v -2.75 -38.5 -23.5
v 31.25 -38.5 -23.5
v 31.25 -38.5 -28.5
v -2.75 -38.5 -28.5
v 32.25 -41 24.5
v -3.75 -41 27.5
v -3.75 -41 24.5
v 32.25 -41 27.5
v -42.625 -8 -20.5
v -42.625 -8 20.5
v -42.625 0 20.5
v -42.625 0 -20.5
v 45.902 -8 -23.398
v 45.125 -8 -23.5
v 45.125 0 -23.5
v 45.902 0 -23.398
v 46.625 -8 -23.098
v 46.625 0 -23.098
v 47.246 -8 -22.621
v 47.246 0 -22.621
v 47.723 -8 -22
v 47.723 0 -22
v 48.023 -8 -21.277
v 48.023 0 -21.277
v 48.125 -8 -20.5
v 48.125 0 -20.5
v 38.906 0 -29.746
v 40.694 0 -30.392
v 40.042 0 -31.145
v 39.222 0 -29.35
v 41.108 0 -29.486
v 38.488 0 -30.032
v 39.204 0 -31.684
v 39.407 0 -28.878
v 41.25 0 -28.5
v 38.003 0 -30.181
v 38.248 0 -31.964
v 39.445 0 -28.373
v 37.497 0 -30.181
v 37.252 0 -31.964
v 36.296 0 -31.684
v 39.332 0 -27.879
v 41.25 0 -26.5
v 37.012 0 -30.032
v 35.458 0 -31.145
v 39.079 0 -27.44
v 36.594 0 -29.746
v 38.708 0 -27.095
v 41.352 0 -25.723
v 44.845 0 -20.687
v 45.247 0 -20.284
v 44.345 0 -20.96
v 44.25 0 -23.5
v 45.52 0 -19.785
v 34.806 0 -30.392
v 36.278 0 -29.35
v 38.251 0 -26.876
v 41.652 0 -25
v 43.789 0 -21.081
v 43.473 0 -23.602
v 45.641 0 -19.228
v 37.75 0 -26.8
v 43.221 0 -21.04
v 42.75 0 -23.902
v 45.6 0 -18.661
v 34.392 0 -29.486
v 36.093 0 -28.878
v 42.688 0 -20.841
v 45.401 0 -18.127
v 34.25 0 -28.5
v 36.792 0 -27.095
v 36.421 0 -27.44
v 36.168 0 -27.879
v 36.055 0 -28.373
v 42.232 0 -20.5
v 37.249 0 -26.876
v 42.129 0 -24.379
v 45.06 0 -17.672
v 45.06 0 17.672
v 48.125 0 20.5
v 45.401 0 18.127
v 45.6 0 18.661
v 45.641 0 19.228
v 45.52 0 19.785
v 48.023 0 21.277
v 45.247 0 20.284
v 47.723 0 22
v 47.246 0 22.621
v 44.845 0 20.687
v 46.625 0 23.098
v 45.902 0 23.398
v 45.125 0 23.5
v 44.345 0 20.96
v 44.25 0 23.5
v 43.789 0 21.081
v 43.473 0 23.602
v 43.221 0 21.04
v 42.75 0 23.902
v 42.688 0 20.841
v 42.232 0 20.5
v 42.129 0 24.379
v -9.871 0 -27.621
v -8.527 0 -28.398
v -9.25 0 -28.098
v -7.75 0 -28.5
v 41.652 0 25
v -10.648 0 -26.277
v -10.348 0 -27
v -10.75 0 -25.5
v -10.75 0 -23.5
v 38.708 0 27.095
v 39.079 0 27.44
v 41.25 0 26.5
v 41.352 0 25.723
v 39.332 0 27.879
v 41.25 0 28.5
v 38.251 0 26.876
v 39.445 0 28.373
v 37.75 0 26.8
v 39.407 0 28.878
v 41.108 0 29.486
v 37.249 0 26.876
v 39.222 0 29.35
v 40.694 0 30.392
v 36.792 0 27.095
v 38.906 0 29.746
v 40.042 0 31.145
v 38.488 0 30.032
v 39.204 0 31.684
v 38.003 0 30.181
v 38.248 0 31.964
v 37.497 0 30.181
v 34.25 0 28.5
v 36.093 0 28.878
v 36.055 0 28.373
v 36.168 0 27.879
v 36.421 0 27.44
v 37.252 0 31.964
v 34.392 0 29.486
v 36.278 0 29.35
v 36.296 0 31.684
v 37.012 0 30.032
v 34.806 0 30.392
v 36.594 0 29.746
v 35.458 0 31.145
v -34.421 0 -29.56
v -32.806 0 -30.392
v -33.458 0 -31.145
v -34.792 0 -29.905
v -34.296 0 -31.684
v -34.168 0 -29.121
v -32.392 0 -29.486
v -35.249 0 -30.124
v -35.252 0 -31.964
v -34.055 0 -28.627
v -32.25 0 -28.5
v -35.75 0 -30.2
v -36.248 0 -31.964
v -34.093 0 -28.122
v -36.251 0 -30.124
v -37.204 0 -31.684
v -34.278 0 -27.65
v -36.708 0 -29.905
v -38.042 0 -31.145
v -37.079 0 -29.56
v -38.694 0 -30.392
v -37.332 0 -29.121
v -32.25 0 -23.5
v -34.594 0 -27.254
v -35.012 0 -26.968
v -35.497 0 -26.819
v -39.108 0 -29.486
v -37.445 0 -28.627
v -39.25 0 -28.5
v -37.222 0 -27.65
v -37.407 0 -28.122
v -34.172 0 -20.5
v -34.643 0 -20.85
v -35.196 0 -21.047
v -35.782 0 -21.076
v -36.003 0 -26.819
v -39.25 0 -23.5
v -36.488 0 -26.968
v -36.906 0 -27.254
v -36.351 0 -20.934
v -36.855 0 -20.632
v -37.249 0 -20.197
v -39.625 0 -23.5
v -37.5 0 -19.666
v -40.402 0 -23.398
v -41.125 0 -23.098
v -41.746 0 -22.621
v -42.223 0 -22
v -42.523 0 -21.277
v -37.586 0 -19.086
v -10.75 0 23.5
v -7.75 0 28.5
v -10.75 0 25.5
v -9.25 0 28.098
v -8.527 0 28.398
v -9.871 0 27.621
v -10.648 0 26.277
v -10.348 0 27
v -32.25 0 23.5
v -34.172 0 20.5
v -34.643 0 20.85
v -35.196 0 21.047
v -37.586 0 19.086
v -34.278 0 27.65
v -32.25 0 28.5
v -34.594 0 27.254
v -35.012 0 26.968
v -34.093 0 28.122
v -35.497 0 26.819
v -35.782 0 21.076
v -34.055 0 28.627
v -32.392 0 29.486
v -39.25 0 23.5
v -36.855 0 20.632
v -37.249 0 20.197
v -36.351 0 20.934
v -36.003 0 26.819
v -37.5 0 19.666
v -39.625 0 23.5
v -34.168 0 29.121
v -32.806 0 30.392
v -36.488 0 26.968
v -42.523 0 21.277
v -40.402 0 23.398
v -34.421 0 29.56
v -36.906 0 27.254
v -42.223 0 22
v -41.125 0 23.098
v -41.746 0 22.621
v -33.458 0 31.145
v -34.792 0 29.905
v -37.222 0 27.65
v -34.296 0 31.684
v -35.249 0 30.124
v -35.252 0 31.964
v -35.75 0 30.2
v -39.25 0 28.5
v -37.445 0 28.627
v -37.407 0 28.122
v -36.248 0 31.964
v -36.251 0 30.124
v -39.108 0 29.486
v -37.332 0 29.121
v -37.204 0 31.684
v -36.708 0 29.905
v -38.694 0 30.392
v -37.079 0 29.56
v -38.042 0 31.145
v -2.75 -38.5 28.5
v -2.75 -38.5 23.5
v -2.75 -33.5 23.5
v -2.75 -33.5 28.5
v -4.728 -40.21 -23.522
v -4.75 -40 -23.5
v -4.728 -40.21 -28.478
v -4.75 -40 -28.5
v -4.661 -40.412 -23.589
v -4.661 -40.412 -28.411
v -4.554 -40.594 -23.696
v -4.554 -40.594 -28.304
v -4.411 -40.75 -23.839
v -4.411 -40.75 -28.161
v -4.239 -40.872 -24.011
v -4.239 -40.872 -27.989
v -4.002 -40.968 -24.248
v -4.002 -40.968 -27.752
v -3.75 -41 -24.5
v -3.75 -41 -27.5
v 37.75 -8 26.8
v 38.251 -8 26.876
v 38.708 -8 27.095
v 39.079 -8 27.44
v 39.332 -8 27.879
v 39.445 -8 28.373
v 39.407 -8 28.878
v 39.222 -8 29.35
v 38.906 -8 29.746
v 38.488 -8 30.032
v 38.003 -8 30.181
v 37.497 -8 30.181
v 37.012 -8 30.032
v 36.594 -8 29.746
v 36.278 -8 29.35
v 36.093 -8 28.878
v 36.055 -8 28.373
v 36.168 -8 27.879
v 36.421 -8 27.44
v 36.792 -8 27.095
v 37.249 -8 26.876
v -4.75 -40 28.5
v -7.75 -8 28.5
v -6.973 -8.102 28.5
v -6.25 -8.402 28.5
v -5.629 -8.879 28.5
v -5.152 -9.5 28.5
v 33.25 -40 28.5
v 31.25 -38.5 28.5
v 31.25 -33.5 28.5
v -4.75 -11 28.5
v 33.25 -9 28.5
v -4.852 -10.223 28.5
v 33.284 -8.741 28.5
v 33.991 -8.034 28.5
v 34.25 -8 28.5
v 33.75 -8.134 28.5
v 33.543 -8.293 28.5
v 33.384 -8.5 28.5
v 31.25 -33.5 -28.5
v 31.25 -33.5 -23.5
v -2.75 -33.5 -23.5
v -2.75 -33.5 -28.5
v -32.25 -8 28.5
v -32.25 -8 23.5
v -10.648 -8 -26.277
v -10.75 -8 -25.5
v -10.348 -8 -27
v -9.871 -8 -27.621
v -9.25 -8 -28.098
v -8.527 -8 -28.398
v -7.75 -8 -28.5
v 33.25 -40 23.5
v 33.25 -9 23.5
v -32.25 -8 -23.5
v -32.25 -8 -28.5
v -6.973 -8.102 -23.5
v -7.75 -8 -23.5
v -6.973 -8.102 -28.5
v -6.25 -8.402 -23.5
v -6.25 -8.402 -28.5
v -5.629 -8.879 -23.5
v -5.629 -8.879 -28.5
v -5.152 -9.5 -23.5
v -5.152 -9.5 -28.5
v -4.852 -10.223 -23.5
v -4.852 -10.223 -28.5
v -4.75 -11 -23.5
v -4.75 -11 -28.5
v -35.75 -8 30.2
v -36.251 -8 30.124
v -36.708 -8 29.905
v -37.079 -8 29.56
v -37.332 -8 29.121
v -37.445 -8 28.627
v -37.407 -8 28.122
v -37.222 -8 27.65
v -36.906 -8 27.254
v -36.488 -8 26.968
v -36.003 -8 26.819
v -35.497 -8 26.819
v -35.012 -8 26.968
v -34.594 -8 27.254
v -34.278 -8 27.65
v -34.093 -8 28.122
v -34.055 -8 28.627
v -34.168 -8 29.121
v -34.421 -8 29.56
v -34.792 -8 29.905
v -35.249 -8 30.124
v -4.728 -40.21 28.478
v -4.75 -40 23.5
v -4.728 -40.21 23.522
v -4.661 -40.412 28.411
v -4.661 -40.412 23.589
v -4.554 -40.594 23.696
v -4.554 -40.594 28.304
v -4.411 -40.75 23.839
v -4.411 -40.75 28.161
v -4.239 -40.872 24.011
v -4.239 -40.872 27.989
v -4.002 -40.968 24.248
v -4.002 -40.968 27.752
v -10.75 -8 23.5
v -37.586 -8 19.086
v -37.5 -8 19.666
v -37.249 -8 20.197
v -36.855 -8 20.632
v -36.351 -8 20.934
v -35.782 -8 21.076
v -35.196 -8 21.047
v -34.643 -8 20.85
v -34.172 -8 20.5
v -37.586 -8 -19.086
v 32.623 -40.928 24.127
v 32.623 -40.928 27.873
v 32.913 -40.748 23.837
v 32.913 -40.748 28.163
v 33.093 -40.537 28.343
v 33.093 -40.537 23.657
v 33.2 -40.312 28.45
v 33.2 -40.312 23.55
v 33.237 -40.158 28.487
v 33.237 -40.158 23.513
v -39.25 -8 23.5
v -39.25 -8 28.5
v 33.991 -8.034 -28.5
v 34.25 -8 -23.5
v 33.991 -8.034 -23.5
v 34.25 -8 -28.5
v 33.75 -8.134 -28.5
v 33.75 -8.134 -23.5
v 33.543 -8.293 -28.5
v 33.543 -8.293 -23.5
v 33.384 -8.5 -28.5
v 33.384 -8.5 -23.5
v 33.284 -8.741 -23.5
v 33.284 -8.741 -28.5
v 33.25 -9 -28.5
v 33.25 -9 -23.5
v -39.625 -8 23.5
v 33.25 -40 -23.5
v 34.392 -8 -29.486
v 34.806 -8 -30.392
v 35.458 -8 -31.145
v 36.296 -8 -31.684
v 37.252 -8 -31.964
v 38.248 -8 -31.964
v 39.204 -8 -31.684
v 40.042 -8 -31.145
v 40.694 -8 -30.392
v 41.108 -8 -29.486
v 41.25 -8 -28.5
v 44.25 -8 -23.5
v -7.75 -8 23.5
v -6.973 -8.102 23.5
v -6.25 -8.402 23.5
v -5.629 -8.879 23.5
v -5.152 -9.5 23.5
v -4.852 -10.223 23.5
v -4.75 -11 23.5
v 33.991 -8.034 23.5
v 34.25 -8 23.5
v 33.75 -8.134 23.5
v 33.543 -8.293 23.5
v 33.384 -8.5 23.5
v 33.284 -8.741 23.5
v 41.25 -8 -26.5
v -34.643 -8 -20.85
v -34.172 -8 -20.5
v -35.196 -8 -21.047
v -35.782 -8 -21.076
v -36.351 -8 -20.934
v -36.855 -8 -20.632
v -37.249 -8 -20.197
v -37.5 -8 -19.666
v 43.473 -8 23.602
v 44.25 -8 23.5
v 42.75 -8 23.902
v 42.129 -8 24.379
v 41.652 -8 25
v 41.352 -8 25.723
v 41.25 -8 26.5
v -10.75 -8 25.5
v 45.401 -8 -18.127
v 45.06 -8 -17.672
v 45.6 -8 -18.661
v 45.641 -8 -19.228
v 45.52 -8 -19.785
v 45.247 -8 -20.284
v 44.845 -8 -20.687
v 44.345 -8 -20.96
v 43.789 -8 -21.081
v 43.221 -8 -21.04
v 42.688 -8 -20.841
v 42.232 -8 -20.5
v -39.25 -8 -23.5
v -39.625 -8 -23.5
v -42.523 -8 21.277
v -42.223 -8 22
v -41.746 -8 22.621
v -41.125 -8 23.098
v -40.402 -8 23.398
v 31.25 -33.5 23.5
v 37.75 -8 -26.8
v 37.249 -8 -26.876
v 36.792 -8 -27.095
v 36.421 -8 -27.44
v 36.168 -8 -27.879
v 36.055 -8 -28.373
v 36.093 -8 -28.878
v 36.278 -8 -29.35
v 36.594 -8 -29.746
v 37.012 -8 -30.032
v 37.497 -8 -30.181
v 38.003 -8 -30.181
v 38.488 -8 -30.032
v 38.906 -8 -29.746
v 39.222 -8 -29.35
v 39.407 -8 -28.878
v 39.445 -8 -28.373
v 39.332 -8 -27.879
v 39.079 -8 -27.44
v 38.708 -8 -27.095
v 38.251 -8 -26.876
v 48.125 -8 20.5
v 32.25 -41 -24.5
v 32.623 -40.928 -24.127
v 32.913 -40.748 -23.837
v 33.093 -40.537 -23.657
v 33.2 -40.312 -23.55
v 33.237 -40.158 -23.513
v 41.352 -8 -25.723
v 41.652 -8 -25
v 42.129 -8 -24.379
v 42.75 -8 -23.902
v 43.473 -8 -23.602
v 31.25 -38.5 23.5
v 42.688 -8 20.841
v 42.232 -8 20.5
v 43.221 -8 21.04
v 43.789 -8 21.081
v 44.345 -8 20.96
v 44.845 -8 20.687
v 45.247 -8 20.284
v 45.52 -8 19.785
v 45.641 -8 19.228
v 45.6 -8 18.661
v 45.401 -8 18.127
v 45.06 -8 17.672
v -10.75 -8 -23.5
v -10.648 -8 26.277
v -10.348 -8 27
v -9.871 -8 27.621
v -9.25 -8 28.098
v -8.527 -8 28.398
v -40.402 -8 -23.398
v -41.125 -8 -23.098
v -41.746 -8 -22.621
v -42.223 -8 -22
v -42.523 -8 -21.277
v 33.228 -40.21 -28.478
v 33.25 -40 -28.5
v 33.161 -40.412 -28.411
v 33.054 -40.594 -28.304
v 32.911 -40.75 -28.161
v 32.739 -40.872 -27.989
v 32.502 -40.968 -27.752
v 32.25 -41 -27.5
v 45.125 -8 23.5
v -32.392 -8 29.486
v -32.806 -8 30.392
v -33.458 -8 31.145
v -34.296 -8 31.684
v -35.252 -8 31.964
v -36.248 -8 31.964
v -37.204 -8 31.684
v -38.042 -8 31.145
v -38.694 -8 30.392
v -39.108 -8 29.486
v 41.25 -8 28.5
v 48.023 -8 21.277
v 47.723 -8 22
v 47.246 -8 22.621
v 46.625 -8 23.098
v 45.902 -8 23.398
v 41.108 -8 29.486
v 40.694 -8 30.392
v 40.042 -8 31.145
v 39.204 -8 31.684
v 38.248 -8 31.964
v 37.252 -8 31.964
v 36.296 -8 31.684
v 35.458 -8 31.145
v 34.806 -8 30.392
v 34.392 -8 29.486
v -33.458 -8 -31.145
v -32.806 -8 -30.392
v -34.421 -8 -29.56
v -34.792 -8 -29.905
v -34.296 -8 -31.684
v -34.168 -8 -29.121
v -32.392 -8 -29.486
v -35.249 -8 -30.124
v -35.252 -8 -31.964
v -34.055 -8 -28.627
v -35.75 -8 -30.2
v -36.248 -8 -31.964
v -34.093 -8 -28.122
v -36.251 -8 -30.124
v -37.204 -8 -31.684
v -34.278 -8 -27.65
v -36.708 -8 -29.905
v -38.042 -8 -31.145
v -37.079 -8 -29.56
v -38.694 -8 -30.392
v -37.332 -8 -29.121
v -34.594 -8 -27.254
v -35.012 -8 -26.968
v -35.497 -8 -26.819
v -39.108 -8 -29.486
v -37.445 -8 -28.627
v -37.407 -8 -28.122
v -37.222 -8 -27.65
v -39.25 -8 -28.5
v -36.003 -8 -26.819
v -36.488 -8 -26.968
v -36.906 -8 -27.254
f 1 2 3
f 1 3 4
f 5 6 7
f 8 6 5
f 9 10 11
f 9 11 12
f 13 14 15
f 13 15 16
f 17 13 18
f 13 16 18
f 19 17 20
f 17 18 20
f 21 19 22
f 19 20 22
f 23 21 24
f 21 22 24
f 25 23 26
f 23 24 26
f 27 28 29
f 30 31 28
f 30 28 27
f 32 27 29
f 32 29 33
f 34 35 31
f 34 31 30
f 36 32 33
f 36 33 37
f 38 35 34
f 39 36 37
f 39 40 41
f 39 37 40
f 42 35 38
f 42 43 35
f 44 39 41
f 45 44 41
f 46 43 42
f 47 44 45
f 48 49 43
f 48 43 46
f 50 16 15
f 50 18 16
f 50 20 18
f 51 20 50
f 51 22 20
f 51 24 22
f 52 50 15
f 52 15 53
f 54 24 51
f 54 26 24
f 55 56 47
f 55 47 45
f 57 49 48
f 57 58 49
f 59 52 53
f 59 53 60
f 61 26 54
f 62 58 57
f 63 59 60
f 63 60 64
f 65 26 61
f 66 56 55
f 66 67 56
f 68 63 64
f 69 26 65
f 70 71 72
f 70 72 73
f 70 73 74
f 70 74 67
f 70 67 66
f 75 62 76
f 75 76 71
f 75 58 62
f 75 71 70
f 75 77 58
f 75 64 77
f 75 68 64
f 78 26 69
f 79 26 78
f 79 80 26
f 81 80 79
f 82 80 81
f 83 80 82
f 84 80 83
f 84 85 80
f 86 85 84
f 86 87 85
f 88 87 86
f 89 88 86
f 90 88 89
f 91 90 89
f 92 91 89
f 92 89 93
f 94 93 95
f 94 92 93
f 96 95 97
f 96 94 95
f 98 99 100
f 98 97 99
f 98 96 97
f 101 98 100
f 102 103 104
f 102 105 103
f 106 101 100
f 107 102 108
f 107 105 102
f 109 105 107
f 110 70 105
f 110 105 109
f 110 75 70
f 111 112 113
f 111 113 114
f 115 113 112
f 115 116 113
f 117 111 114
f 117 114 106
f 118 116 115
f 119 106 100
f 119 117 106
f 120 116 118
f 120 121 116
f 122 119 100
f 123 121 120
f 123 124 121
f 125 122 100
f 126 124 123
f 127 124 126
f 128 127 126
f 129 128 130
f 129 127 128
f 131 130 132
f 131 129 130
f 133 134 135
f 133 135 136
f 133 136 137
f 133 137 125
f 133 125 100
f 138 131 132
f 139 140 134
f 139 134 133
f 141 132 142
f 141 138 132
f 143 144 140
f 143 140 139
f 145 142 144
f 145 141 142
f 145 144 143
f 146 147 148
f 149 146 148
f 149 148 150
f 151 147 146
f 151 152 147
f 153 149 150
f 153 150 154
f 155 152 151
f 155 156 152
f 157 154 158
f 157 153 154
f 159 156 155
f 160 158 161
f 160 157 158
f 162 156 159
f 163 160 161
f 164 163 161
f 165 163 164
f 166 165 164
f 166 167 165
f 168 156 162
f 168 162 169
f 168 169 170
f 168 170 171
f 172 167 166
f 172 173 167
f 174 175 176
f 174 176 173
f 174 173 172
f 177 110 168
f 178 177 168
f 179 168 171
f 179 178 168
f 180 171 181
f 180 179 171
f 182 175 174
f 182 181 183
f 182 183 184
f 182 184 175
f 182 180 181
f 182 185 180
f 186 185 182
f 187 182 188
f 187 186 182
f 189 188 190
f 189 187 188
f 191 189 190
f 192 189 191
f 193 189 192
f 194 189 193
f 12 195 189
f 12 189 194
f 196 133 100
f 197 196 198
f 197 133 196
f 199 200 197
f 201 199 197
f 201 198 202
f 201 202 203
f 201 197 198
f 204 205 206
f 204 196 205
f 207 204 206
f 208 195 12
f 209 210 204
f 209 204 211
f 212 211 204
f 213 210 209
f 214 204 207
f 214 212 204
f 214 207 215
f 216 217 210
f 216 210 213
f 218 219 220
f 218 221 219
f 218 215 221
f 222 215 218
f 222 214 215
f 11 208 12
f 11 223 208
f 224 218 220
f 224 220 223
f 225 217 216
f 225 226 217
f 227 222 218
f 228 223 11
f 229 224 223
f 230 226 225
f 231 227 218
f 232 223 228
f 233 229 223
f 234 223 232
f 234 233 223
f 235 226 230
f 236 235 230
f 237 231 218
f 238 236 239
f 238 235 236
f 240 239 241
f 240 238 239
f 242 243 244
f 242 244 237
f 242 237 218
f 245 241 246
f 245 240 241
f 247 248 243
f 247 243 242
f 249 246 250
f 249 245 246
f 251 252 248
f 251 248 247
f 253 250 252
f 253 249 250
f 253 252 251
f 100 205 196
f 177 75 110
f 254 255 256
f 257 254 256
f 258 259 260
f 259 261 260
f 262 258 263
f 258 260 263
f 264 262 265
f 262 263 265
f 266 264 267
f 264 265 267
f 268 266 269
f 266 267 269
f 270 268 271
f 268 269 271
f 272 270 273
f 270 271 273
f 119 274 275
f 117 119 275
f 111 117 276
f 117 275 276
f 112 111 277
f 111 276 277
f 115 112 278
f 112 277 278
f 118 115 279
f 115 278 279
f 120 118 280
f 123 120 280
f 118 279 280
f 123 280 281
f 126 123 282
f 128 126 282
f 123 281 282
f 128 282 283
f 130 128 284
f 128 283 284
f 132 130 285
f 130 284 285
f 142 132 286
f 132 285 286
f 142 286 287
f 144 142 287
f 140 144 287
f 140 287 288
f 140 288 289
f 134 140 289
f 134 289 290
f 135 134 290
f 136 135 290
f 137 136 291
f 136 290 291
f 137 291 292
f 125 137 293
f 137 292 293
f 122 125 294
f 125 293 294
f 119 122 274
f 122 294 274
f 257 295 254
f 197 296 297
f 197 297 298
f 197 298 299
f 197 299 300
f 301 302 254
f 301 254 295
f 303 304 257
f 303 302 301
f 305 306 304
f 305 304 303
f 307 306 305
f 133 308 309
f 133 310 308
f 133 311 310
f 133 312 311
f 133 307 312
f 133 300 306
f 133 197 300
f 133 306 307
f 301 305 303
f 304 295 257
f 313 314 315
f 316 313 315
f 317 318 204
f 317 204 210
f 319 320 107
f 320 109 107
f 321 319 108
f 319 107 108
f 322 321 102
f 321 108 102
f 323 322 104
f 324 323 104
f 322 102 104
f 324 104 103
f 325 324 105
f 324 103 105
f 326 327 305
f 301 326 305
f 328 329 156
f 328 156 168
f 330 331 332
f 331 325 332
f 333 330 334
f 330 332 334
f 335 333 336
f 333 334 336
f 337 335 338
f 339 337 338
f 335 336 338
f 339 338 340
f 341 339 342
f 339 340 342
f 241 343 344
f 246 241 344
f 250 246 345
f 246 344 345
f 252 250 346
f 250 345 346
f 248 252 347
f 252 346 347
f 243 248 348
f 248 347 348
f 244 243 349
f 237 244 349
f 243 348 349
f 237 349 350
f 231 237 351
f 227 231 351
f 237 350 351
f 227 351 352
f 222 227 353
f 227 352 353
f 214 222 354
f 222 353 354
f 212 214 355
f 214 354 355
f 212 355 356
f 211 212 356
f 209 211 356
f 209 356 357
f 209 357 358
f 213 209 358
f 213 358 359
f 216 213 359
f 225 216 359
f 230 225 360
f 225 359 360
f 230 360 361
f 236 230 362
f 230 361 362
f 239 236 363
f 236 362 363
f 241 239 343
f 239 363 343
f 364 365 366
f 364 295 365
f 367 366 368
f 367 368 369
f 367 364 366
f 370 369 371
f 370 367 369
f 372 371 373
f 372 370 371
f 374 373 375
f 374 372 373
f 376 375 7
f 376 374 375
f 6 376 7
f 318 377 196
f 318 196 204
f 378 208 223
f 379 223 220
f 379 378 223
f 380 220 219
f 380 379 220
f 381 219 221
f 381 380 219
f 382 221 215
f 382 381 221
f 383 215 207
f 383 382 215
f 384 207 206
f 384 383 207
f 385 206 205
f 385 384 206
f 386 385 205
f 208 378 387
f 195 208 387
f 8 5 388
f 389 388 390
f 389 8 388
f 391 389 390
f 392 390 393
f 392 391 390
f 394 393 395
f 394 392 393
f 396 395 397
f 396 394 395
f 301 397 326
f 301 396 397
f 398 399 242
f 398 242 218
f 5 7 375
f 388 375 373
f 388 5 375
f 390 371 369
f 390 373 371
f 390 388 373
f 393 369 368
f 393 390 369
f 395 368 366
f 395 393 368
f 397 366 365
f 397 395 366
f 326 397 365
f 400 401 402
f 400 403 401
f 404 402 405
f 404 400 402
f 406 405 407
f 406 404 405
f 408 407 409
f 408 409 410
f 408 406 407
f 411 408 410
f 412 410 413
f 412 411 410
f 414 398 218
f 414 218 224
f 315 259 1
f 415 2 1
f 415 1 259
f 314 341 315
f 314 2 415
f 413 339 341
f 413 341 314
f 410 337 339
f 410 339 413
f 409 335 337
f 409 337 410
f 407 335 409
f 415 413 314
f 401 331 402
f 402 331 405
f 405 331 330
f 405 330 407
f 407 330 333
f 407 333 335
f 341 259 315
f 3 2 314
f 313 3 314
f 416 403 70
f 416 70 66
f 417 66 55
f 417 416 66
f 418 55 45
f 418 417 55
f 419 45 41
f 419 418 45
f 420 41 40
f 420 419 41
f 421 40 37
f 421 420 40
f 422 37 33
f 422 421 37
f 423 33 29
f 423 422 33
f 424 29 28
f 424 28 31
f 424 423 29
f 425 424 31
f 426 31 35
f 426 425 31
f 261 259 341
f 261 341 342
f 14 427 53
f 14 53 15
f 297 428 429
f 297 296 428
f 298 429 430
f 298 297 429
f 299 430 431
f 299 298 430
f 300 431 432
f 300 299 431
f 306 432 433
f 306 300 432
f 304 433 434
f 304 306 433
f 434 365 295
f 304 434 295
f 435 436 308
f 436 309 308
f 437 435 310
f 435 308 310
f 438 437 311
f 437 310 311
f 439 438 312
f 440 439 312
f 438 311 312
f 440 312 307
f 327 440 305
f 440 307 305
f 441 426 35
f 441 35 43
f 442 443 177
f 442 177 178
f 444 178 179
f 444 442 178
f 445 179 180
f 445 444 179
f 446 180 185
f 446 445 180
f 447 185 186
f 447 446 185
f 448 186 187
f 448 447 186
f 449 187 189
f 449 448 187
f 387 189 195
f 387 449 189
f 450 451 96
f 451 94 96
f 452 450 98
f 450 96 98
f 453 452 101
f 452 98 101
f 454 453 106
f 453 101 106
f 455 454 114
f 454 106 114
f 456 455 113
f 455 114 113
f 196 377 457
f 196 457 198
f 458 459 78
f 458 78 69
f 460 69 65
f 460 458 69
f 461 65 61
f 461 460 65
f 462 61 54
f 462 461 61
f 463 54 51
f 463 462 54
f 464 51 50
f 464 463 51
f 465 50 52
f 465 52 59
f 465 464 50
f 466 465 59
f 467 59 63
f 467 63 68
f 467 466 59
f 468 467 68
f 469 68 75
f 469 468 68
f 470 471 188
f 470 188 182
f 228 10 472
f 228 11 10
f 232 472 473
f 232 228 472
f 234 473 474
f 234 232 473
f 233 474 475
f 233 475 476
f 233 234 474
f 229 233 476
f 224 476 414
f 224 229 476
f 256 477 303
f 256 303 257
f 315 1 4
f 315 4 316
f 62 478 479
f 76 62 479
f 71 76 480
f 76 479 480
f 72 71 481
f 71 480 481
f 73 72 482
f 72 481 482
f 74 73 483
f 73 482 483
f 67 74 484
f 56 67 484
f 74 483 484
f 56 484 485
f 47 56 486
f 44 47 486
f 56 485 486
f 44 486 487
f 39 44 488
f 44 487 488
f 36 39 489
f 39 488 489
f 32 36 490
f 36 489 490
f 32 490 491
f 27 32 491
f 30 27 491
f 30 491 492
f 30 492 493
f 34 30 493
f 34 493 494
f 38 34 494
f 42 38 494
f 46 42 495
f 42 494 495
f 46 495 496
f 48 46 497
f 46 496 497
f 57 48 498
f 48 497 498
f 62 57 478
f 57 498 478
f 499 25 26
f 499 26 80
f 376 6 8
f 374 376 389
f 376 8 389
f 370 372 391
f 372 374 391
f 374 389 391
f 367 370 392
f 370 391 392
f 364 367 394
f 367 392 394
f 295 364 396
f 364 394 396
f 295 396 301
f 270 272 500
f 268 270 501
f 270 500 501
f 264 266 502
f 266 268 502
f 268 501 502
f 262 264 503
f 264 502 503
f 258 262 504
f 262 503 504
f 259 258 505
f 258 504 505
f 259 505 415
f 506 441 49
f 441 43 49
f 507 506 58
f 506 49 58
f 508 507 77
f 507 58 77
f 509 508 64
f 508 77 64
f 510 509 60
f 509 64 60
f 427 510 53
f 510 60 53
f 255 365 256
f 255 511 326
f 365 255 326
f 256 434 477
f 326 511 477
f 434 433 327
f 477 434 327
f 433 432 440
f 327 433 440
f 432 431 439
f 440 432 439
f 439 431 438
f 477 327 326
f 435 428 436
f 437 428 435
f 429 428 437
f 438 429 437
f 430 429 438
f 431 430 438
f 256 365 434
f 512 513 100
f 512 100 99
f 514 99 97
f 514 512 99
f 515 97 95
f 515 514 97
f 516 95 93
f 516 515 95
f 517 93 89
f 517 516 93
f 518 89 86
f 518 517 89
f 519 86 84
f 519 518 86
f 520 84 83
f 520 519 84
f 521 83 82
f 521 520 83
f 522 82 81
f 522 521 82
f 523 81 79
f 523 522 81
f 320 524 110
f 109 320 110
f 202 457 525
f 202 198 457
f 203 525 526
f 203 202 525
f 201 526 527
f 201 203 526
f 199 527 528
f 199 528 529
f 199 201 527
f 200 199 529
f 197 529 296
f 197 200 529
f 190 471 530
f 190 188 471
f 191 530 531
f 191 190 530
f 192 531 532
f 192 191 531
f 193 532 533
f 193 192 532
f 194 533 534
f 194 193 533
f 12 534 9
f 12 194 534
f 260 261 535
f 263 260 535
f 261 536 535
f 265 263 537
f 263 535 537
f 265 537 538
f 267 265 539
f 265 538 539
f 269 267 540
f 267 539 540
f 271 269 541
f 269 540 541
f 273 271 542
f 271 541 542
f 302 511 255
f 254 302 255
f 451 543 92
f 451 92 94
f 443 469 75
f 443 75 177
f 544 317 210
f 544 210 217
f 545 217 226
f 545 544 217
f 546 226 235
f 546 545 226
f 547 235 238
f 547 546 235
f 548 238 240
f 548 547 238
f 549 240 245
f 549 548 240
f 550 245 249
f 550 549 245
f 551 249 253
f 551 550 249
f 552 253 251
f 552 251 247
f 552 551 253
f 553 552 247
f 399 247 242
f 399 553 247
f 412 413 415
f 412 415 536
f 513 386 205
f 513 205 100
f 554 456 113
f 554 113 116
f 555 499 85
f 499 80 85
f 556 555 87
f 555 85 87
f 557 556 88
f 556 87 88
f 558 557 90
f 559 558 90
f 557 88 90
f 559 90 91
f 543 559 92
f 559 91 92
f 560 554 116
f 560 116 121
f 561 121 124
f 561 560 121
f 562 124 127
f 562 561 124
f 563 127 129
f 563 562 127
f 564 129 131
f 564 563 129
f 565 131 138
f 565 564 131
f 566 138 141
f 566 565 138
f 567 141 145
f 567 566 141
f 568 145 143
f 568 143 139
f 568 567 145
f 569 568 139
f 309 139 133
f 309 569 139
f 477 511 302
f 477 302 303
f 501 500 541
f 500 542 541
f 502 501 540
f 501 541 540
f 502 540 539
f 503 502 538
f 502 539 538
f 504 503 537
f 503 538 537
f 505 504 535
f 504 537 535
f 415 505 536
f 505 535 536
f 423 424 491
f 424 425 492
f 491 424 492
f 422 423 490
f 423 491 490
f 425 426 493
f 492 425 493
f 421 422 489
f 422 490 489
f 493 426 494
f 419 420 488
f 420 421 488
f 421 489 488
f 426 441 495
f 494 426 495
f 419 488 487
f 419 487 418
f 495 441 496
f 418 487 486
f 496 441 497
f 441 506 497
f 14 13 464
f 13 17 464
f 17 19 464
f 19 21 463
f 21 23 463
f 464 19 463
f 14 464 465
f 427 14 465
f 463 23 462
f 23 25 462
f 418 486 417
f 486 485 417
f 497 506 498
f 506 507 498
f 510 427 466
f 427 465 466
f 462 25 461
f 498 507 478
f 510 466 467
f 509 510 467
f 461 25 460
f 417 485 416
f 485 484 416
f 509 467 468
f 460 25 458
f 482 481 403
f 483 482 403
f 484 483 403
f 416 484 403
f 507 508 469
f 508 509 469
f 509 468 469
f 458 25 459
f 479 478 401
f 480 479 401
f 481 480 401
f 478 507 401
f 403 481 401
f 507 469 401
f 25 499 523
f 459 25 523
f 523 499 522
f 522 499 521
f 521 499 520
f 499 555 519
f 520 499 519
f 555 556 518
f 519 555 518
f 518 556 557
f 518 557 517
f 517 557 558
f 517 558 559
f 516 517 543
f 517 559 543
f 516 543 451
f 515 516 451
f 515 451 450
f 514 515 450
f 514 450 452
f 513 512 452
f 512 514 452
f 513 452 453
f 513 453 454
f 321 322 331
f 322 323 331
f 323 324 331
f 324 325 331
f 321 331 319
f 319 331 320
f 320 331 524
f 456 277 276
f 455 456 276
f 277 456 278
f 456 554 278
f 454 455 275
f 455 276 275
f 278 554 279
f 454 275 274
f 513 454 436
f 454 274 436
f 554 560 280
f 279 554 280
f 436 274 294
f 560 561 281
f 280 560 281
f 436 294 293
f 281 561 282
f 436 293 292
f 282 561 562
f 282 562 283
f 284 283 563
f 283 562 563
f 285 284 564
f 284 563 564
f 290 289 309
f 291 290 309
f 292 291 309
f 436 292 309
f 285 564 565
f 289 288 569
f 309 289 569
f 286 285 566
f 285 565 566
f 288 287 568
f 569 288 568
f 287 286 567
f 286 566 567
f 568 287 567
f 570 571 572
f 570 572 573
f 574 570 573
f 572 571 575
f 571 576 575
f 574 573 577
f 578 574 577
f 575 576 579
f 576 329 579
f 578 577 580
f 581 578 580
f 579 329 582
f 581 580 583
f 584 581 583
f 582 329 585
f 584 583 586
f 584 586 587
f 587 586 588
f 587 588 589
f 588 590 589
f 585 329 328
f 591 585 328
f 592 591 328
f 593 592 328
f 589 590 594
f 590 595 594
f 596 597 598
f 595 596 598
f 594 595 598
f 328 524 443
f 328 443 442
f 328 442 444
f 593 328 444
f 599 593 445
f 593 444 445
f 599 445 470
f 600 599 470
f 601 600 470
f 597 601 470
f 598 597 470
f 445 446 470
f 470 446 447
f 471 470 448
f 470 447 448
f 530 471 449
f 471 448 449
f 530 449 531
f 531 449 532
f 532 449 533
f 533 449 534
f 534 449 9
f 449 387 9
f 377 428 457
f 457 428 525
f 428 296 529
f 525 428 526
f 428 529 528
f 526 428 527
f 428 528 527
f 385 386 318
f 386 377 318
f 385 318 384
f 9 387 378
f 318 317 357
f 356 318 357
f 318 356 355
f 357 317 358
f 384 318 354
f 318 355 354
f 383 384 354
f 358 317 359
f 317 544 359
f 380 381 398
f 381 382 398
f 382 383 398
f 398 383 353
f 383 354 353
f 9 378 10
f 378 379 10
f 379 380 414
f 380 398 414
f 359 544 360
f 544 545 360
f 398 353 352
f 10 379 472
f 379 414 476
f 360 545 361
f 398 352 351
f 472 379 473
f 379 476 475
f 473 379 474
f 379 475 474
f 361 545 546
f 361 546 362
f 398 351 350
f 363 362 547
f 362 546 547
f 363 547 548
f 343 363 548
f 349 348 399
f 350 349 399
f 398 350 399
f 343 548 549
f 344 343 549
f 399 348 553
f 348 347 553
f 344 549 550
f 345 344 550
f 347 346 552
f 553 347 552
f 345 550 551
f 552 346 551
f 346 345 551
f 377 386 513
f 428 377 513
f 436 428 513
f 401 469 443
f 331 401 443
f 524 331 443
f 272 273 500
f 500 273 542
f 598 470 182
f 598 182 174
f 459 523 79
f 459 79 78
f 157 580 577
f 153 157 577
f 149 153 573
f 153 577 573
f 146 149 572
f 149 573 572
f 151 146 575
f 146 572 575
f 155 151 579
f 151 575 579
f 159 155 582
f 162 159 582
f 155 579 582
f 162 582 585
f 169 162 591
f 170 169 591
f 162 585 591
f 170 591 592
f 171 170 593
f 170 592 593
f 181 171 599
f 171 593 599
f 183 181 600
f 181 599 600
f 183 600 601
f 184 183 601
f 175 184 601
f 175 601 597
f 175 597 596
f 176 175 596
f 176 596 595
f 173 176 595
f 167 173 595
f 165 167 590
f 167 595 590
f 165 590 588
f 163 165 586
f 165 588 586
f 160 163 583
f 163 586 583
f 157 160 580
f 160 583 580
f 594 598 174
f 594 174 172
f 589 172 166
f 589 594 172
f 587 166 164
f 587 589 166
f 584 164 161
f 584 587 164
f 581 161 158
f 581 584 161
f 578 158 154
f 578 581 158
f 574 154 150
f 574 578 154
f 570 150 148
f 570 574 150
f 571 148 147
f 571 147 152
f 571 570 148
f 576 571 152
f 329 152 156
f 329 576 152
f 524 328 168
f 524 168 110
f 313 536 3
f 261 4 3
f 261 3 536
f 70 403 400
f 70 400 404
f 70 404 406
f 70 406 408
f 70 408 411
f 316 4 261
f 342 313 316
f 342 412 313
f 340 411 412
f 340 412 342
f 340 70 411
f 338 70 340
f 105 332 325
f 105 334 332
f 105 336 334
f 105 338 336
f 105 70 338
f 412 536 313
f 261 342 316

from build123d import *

# Parameters (mm, degrees)
EXTRUDE_1_DEPTH     = 23.5
EXTRUDE_START       = 8
SKETCH_2_R          = 1.7
EXTRUDE_2_DEPTH     = 8
CUT_EXTRUDE_1_REACH = 98.655
CUT_EXTRUDE_2_REACH = 79.127
CUT_EXTRUDE_3_REACH = 93.669
SKETCH_9_W          = 45
SKETCH_9_H          = 8
EXTRUDE_3_DEPTH     = 5
SKETCH_10_W         = 45
SKETCH_10_H         = 8
EXTRUDE_4_DEPTH     = 5
SKETCH_11_W         = 38
SKETCH_11_H         = 5
EXTRUDE_5_DEPTH     = 33
SKETCH_12_W         = 34
SKETCH_12_H         = 5
CUT_EXTRUDE_4_DEPTH = 5
CUT_EXTRUDE_START   = -23.5
CUT_EXTRUDE_5_DEPTH = 23.5
CUT_EXTRUDE_6_DEPTH = 67.550849919
FILLET_1_R          = 3
FILLET_2_R          = 1
FILLET_3_R          = 1


with BuildPart() as part:
    # 草图1 → 凸台-拉伸1 (new body)
    with BuildSketch(Plane(origin=(0, 0, 0), x_dir=(1, 0, 0), z_dir=(0, 1, 0))):
        with BuildLine():
            Line((-38, 23.5), (40, 23.5))
            Line((40, 23.5), (40, -23.5))
            Line((40, -23.5), (-38, -23.5))
            ThreePointArc((-38, -23.5), (-39.414213562, -22.914213562), (-40, -21.5))
            Line((-40, -21.5), (-40, 21.5))
            ThreePointArc((-40, 21.5), (-39.414213562, 22.914213562), (-38, 23.5))
        make_face()
        with BuildLine():
            Line((-34.171572875, -20.5), (36, -20.5))
            ThreePointArc((36, -20.5), (37.414213562, -19.914213562), (38, -18.5))
            Line((38, -18.5), (38, 18.5))
            ThreePointArc((38, 18.5), (37.414213562, 19.914213562), (36, 20.5))
            Line((36, 20.5), (-34.171572875, 20.5))
            ThreePointArc((-34.171572875, 20.5), (-37, 20.5), (-37, 17.671572875))
            Line((-37, 17.671572875), (-37, -17.671572875))
            ThreePointArc((-37, -17.671572875), (-37, -20.5), (-34.171572875, -20.5))
        make_face(mode=Mode.SUBTRACT)
    extrude(amount=EXTRUDE_1_DEPTH)

    # 草图2 → 凸台-拉伸2 (add)
    with BuildSketch(Plane.XZ.offset(EXTRUDE_START)):
        with BuildLine():
            Line((48.125, 23.5), (41.25, 23.5))
            Line((41.25, 23.5), (41.25, 28.5))
            ThreePointArc((41.25, 28.5), (37.75, 32), (34.25, 28.5))
            Line((34.25, 28.5), (34.25, 23.5))
            Line((34.25, 23.5), (-32.25, 23.5))
            Line((-32.25, 23.5), (-32.25, 28.5))
            ThreePointArc((-32.25, 28.5), (-35.75, 32), (-39.25, 28.5))
            Line((-39.25, 28.5), (-39.25, 23.5))
            Line((-39.25, 23.5), (-42.625, 23.5))
            Line((-42.625, 23.5), (-42.625, -23.5))
            Line((-42.625, -23.5), (-39.25, -23.5))
            Line((-39.25, -23.5), (-39.25, -28.5))
            ThreePointArc((-39.25, -28.5), (-35.75, -32), (-32.25, -28.5))
            Line((-32.25, -28.5), (-32.25, -23.5))
            Line((-32.25, -23.5), (34.25, -23.5))
            Line((34.25, -23.5), (34.25, -28.5))
            ThreePointArc((34.25, -28.5), (37.75, -32), (41.25, -28.5))
            Line((41.25, -28.5), (41.25, -23.5))
            Line((41.25, -23.5), (48.125, -23.5))
            Line((48.125, -23.5), (48.125, 23.5))
        make_face()
        with Locations(Location((37.75, 28.5, 0), (0, 0, 270))):
            Circle(SKETCH_2_R, mode=Mode.SUBTRACT)
        with Locations(Location((37.75, -28.5, 0), (0, 0, 90))):
            Circle(SKETCH_2_R, mode=Mode.SUBTRACT)
        with Locations(Location((-35.75, -28.5, 0), (0, 0, 270))):
            Circle(SKETCH_2_R, mode=Mode.SUBTRACT)
        with Locations(Location((-35.75, 28.5, 0), (0, 0, 90))):
            Circle(SKETCH_2_R, mode=Mode.SUBTRACT)
        with BuildLine():
            Line((-34.171572875, 20.5), (42.231907087, 20.5))
            ThreePointArc((42.231907087, 20.5), (45.060334211, 20.5), (45.060334211, 17.671572875))
            Line((45.060334211, 17.671572875), (45.060334211, -17.671572875))
            ThreePointArc((45.060334211, -17.671572875), (45.060334211, -20.5), (42.231907087, -20.5))
            Line((42.231907087, -20.5), (-34.171572875, -20.5))
            ThreePointArc((-34.171572875, -20.5), (-37, -20.5), (-37, -17.671572875))
            Line((-37, -17.671572875), (-37, 17.671572875))
            ThreePointArc((-37, 17.671572875), (-37, 20.5), (-34.171572875, 20.5))
        make_face(mode=Mode.SUBTRACT)
    extrude(amount=-EXTRUDE_2_DEPTH)

    # 草图4 → 切除-拉伸1 (cut, up to next)
    with BuildSketch(Plane.ZY.offset(40), mode=Mode.PRIVATE) as cut_extrude_1_sk1:
        with BuildLine():
            Line((17, 0), (-17, 0))
            ThreePointArc((-17, 0), (-19.121320344, 0.878679656), (-20, 3))
            Line((-20, 3), (-20, 17.5))
            ThreePointArc((-20, 17.5), (-19.121320344, 19.621320344), (-17, 20.5))
            Line((-17, 20.5), (17, 20.5))
            ThreePointArc((17, 20.5), (19.121320344, 19.621320344), (20, 17.5))
            Line((20, 17.5), (20, 3))
            ThreePointArc((20, 3), (19.121320344, 0.878679656), (17, 0))
        make_face()
    cut_extrude_1_tool1 = extrude(cut_extrude_1_sk1.sketch, amount=-CUT_EXTRUDE_1_REACH, mode=Mode.PRIVATE) & part.part
    add(cut_extrude_1_tool1.solids().sort_by_distance((-40, 10.25, 0))[0], mode=Mode.SUBTRACT)

    # 切除-拉伸2: up to this face of the body (flat: up to its plane)
    cut_extrude_2_end = Plane(part.part.faces().sort_by_distance((1, 8.207082452, 23.5))[0])
    # 草图5 → 切除-拉伸2 (cut, up to the picked face)
    with BuildSketch(Plane(origin=(0, 0, -23.5), x_dir=(-1, 0, 0), z_dir=(0, 0, -1)), mode=Mode.PRIVATE) as cut_extrude_2_sk1:
        with BuildLine():
            Line((-37, 11.75), (-37, 17.5))
            ThreePointArc((-37, 17.5), (-36.414213562, 18.914213562), (-35, 19.5))
            Line((-35, 19.5), (33, 19.5))
            ThreePointArc((33, 19.5), (34.414213562, 18.914213562), (35, 17.5))
            Line((35, 17.5), (35, 6))
            ThreePointArc((35, 6), (34.414213562, 4.585786438), (33, 4))
            Line((33, 4), (-35, 4))
            ThreePointArc((-35, 4), (-36.414213562, 4.585786438), (-37, 6))
            Line((-37, 6), (-37, 11.75))
        make_face()
    cut_extrude_2_tool1 = split(extrude(cut_extrude_2_sk1.sketch, amount=-CUT_EXTRUDE_2_REACH, mode=Mode.PRIVATE), bisect_by=cut_extrude_2_end, keep=Keep.BOTH, mode=Mode.PRIVATE)
    add(cut_extrude_2_tool1.solids().sort_by(Axis((1, 11.75, -23.5), (0, 0, 1)))[0], mode=Mode.SUBTRACT)

    # 草图6 → 切除-拉伸3 (cut, up to next)
    with BuildSketch(Plane(origin=(40, 0, 0), x_dir=(0, 0, -1), z_dir=(1, 0, 0)), mode=Mode.PRIVATE) as cut_extrude_3_sk1:
        with BuildLine():
            Line((21, 5), (21, 18.5))
            ThreePointArc((21, 18.5), (20.414213562, 19.914213562), (19, 20.5))
            Line((19, 20.5), (-19, 20.5))
            ThreePointArc((-19, 20.5), (-20.414213562, 19.914213562), (-21, 18.5))
            Line((-21, 18.5), (-21, 5))
            Line((-21, 5), (-21, 0))
            Line((-21, 0), (-16, 0))
            Line((-16, 0), (16, 0))
            Line((16, 0), (21, 0))
            Line((21, 0), (21, 5))
        make_face()
    cut_extrude_3_tool1 = extrude(cut_extrude_3_sk1.sketch, amount=-CUT_EXTRUDE_3_REACH, mode=Mode.PRIVATE) & part.part
    add(cut_extrude_3_tool1.solids().sort_by_distance((40, 10.230413, 0))[0], mode=Mode.SUBTRACT)

    # 草图9 → 凸台-拉伸3 (add)
    with BuildSketch(Plane.XY.offset(23.5)):
        with Locations((11.75, -4)):
            Rectangle(SKETCH_9_W, SKETCH_9_H)
    extrude(amount=EXTRUDE_3_DEPTH)

    # 草图10 → 凸台-拉伸4 (add)
    with BuildSketch(Plane(origin=(0, 0, -23.5), x_dir=(-1, 0, 0), z_dir=(0, 0, -1))):
        with Locations((-11.75, -4)):
            Rectangle(SKETCH_10_W, SKETCH_10_H)
    extrude(amount=EXTRUDE_4_DEPTH)

    # 草图11 → 凸台-拉伸5 (add)
    with BuildSketch(Plane.XZ.offset(8)):
        with Locations((14.25, 26)):
            Rectangle(SKETCH_11_W, SKETCH_11_H)
    extrude_5 = extrude(amount=EXTRUDE_5_DEPTH)

    # 草图12 → 切除-拉伸4 (cut)
    with BuildSketch(Plane(origin=(0, 0, 23.5), x_dir=(-1, 0, 0), z_dir=(0, 0, -1))):
        with Locations((-14.25, -36)):
            Rectangle(SKETCH_12_W, SKETCH_12_H)
    cut_extrude_4 = extrude(amount=-CUT_EXTRUDE_4_DEPTH, mode=Mode.SUBTRACT)

    # 镜向1: 凸台-拉伸5, 切除-拉伸4 across plane
    add(extrude_5.mirror(Plane.XY))
    add(cut_extrude_4.mirror(Plane.XY), mode=Mode.SUBTRACT)

    # 草图13 → 切除-拉伸5 (cut)
    with BuildSketch(Plane(origin=(0, 23.5, 0), x_dir=(1, 0, 0), z_dir=(0, 1, 0)).offset(CUT_EXTRUDE_START)):
        with BuildLine():
            Line((-38, 23.5), (40, 23.5))
            Line((40, 23.5), (40, -23.5))
            Line((40, -23.5), (-38, -23.5))
            ThreePointArc((-38, -23.5), (-39.414213562, -22.914213562), (-40, -21.5))
            Line((-40, -21.5), (-40, 21.5))
            ThreePointArc((-40, 21.5), (-39.414213562, 22.914213562), (-38, 23.5))
        make_face()
        with BuildLine():
            Line((38, 18.5), (38, -18.5))
            ThreePointArc((38, -18.5), (37.414213562, -19.914213562), (36, -20.5))
            Line((36, -20.5), (-34.171572875, -20.5))
            ThreePointArc((-34.171572875, -20.5), (-37, -20.5), (-37, -17.671572875))
            Line((-37, -17.671572875), (-37, 17.671572875))
            ThreePointArc((-37, 17.671572875), (-37, 20.5), (-34.171572875, 20.5))
            Line((-34.171572875, 20.5), (36, 20.5))
            ThreePointArc((36, 20.5), (37.414213562, 19.914213562), (38, 18.5))
        make_face(mode=Mode.SUBTRACT)
    extrude(amount=CUT_EXTRUDE_5_DEPTH, mode=Mode.SUBTRACT)

    # 草图14 → 切除-拉伸6 (cut, through all)
    with BuildSketch(Plane.XZ.offset(8)):
        with BuildLine():
            Line((-37.585786438, 19.085786438), (-37.585786438, -19.085786438))
            ThreePointArc((-37.585786438, -19.085786438), (-37.433545503, -18.320419573), (-37, -17.671572875))
            Line((-37, -17.671572875), (-37, 17.671572875))
            ThreePointArc((-37, 17.671572875), (-37.433545503, 18.320419573), (-37.585786438, 19.085786438))
        make_face()
    extrude(amount=-CUT_EXTRUDE_6_DEPTH, mode=Mode.SUBTRACT)

    # 圆角1
    fillet_1_edges = [part.edges().sort_by_distance(p)[0] for p in [
        (-10.75, -4, 28.5),
        (-10.75, -4, -28.5),
        (-42.625, -4, 23.5),
        (-42.625, -4, -23.5),
        (-4.75, -8, 26),
        (-4.75, -8, -26),
        (41.25, -4, 23.5),
        (41.25, -4, -23.5),
        (48.125, -4, 23.5),
        (48.125, -4, -23.5),
    ]]
    fillet(fillet_1_edges, radius=FILLET_1_R - 0.0001)  # a hair under: the kernel refuses the full size

    # 圆角2
    fillet_2_edges = [part.edges().sort_by_distance(p)[0] for p in [
        (33.25, -8, 26),
        (33.25, -8, -26),
    ]]
    fillet(fillet_2_edges, radius=FILLET_2_R)

    # 圆角3
    fillet_3_edges = [part.edges().sort_by_distance(p)[0] for p in [
        (-4.75, -41, 26),
        (14.25, -41, 23.5),
        (33.25, -41, 26),
        (14.25, -41, 28.5),
        (-4.75, -41, -26),
        (14.25, -41, -28.5),
        (33.25, -41, -26),
        (14.25, -41, -23.5),
    ]]
    fillet(fillet_3_edges, radius=FILLET_3_R)


solid = part.part
